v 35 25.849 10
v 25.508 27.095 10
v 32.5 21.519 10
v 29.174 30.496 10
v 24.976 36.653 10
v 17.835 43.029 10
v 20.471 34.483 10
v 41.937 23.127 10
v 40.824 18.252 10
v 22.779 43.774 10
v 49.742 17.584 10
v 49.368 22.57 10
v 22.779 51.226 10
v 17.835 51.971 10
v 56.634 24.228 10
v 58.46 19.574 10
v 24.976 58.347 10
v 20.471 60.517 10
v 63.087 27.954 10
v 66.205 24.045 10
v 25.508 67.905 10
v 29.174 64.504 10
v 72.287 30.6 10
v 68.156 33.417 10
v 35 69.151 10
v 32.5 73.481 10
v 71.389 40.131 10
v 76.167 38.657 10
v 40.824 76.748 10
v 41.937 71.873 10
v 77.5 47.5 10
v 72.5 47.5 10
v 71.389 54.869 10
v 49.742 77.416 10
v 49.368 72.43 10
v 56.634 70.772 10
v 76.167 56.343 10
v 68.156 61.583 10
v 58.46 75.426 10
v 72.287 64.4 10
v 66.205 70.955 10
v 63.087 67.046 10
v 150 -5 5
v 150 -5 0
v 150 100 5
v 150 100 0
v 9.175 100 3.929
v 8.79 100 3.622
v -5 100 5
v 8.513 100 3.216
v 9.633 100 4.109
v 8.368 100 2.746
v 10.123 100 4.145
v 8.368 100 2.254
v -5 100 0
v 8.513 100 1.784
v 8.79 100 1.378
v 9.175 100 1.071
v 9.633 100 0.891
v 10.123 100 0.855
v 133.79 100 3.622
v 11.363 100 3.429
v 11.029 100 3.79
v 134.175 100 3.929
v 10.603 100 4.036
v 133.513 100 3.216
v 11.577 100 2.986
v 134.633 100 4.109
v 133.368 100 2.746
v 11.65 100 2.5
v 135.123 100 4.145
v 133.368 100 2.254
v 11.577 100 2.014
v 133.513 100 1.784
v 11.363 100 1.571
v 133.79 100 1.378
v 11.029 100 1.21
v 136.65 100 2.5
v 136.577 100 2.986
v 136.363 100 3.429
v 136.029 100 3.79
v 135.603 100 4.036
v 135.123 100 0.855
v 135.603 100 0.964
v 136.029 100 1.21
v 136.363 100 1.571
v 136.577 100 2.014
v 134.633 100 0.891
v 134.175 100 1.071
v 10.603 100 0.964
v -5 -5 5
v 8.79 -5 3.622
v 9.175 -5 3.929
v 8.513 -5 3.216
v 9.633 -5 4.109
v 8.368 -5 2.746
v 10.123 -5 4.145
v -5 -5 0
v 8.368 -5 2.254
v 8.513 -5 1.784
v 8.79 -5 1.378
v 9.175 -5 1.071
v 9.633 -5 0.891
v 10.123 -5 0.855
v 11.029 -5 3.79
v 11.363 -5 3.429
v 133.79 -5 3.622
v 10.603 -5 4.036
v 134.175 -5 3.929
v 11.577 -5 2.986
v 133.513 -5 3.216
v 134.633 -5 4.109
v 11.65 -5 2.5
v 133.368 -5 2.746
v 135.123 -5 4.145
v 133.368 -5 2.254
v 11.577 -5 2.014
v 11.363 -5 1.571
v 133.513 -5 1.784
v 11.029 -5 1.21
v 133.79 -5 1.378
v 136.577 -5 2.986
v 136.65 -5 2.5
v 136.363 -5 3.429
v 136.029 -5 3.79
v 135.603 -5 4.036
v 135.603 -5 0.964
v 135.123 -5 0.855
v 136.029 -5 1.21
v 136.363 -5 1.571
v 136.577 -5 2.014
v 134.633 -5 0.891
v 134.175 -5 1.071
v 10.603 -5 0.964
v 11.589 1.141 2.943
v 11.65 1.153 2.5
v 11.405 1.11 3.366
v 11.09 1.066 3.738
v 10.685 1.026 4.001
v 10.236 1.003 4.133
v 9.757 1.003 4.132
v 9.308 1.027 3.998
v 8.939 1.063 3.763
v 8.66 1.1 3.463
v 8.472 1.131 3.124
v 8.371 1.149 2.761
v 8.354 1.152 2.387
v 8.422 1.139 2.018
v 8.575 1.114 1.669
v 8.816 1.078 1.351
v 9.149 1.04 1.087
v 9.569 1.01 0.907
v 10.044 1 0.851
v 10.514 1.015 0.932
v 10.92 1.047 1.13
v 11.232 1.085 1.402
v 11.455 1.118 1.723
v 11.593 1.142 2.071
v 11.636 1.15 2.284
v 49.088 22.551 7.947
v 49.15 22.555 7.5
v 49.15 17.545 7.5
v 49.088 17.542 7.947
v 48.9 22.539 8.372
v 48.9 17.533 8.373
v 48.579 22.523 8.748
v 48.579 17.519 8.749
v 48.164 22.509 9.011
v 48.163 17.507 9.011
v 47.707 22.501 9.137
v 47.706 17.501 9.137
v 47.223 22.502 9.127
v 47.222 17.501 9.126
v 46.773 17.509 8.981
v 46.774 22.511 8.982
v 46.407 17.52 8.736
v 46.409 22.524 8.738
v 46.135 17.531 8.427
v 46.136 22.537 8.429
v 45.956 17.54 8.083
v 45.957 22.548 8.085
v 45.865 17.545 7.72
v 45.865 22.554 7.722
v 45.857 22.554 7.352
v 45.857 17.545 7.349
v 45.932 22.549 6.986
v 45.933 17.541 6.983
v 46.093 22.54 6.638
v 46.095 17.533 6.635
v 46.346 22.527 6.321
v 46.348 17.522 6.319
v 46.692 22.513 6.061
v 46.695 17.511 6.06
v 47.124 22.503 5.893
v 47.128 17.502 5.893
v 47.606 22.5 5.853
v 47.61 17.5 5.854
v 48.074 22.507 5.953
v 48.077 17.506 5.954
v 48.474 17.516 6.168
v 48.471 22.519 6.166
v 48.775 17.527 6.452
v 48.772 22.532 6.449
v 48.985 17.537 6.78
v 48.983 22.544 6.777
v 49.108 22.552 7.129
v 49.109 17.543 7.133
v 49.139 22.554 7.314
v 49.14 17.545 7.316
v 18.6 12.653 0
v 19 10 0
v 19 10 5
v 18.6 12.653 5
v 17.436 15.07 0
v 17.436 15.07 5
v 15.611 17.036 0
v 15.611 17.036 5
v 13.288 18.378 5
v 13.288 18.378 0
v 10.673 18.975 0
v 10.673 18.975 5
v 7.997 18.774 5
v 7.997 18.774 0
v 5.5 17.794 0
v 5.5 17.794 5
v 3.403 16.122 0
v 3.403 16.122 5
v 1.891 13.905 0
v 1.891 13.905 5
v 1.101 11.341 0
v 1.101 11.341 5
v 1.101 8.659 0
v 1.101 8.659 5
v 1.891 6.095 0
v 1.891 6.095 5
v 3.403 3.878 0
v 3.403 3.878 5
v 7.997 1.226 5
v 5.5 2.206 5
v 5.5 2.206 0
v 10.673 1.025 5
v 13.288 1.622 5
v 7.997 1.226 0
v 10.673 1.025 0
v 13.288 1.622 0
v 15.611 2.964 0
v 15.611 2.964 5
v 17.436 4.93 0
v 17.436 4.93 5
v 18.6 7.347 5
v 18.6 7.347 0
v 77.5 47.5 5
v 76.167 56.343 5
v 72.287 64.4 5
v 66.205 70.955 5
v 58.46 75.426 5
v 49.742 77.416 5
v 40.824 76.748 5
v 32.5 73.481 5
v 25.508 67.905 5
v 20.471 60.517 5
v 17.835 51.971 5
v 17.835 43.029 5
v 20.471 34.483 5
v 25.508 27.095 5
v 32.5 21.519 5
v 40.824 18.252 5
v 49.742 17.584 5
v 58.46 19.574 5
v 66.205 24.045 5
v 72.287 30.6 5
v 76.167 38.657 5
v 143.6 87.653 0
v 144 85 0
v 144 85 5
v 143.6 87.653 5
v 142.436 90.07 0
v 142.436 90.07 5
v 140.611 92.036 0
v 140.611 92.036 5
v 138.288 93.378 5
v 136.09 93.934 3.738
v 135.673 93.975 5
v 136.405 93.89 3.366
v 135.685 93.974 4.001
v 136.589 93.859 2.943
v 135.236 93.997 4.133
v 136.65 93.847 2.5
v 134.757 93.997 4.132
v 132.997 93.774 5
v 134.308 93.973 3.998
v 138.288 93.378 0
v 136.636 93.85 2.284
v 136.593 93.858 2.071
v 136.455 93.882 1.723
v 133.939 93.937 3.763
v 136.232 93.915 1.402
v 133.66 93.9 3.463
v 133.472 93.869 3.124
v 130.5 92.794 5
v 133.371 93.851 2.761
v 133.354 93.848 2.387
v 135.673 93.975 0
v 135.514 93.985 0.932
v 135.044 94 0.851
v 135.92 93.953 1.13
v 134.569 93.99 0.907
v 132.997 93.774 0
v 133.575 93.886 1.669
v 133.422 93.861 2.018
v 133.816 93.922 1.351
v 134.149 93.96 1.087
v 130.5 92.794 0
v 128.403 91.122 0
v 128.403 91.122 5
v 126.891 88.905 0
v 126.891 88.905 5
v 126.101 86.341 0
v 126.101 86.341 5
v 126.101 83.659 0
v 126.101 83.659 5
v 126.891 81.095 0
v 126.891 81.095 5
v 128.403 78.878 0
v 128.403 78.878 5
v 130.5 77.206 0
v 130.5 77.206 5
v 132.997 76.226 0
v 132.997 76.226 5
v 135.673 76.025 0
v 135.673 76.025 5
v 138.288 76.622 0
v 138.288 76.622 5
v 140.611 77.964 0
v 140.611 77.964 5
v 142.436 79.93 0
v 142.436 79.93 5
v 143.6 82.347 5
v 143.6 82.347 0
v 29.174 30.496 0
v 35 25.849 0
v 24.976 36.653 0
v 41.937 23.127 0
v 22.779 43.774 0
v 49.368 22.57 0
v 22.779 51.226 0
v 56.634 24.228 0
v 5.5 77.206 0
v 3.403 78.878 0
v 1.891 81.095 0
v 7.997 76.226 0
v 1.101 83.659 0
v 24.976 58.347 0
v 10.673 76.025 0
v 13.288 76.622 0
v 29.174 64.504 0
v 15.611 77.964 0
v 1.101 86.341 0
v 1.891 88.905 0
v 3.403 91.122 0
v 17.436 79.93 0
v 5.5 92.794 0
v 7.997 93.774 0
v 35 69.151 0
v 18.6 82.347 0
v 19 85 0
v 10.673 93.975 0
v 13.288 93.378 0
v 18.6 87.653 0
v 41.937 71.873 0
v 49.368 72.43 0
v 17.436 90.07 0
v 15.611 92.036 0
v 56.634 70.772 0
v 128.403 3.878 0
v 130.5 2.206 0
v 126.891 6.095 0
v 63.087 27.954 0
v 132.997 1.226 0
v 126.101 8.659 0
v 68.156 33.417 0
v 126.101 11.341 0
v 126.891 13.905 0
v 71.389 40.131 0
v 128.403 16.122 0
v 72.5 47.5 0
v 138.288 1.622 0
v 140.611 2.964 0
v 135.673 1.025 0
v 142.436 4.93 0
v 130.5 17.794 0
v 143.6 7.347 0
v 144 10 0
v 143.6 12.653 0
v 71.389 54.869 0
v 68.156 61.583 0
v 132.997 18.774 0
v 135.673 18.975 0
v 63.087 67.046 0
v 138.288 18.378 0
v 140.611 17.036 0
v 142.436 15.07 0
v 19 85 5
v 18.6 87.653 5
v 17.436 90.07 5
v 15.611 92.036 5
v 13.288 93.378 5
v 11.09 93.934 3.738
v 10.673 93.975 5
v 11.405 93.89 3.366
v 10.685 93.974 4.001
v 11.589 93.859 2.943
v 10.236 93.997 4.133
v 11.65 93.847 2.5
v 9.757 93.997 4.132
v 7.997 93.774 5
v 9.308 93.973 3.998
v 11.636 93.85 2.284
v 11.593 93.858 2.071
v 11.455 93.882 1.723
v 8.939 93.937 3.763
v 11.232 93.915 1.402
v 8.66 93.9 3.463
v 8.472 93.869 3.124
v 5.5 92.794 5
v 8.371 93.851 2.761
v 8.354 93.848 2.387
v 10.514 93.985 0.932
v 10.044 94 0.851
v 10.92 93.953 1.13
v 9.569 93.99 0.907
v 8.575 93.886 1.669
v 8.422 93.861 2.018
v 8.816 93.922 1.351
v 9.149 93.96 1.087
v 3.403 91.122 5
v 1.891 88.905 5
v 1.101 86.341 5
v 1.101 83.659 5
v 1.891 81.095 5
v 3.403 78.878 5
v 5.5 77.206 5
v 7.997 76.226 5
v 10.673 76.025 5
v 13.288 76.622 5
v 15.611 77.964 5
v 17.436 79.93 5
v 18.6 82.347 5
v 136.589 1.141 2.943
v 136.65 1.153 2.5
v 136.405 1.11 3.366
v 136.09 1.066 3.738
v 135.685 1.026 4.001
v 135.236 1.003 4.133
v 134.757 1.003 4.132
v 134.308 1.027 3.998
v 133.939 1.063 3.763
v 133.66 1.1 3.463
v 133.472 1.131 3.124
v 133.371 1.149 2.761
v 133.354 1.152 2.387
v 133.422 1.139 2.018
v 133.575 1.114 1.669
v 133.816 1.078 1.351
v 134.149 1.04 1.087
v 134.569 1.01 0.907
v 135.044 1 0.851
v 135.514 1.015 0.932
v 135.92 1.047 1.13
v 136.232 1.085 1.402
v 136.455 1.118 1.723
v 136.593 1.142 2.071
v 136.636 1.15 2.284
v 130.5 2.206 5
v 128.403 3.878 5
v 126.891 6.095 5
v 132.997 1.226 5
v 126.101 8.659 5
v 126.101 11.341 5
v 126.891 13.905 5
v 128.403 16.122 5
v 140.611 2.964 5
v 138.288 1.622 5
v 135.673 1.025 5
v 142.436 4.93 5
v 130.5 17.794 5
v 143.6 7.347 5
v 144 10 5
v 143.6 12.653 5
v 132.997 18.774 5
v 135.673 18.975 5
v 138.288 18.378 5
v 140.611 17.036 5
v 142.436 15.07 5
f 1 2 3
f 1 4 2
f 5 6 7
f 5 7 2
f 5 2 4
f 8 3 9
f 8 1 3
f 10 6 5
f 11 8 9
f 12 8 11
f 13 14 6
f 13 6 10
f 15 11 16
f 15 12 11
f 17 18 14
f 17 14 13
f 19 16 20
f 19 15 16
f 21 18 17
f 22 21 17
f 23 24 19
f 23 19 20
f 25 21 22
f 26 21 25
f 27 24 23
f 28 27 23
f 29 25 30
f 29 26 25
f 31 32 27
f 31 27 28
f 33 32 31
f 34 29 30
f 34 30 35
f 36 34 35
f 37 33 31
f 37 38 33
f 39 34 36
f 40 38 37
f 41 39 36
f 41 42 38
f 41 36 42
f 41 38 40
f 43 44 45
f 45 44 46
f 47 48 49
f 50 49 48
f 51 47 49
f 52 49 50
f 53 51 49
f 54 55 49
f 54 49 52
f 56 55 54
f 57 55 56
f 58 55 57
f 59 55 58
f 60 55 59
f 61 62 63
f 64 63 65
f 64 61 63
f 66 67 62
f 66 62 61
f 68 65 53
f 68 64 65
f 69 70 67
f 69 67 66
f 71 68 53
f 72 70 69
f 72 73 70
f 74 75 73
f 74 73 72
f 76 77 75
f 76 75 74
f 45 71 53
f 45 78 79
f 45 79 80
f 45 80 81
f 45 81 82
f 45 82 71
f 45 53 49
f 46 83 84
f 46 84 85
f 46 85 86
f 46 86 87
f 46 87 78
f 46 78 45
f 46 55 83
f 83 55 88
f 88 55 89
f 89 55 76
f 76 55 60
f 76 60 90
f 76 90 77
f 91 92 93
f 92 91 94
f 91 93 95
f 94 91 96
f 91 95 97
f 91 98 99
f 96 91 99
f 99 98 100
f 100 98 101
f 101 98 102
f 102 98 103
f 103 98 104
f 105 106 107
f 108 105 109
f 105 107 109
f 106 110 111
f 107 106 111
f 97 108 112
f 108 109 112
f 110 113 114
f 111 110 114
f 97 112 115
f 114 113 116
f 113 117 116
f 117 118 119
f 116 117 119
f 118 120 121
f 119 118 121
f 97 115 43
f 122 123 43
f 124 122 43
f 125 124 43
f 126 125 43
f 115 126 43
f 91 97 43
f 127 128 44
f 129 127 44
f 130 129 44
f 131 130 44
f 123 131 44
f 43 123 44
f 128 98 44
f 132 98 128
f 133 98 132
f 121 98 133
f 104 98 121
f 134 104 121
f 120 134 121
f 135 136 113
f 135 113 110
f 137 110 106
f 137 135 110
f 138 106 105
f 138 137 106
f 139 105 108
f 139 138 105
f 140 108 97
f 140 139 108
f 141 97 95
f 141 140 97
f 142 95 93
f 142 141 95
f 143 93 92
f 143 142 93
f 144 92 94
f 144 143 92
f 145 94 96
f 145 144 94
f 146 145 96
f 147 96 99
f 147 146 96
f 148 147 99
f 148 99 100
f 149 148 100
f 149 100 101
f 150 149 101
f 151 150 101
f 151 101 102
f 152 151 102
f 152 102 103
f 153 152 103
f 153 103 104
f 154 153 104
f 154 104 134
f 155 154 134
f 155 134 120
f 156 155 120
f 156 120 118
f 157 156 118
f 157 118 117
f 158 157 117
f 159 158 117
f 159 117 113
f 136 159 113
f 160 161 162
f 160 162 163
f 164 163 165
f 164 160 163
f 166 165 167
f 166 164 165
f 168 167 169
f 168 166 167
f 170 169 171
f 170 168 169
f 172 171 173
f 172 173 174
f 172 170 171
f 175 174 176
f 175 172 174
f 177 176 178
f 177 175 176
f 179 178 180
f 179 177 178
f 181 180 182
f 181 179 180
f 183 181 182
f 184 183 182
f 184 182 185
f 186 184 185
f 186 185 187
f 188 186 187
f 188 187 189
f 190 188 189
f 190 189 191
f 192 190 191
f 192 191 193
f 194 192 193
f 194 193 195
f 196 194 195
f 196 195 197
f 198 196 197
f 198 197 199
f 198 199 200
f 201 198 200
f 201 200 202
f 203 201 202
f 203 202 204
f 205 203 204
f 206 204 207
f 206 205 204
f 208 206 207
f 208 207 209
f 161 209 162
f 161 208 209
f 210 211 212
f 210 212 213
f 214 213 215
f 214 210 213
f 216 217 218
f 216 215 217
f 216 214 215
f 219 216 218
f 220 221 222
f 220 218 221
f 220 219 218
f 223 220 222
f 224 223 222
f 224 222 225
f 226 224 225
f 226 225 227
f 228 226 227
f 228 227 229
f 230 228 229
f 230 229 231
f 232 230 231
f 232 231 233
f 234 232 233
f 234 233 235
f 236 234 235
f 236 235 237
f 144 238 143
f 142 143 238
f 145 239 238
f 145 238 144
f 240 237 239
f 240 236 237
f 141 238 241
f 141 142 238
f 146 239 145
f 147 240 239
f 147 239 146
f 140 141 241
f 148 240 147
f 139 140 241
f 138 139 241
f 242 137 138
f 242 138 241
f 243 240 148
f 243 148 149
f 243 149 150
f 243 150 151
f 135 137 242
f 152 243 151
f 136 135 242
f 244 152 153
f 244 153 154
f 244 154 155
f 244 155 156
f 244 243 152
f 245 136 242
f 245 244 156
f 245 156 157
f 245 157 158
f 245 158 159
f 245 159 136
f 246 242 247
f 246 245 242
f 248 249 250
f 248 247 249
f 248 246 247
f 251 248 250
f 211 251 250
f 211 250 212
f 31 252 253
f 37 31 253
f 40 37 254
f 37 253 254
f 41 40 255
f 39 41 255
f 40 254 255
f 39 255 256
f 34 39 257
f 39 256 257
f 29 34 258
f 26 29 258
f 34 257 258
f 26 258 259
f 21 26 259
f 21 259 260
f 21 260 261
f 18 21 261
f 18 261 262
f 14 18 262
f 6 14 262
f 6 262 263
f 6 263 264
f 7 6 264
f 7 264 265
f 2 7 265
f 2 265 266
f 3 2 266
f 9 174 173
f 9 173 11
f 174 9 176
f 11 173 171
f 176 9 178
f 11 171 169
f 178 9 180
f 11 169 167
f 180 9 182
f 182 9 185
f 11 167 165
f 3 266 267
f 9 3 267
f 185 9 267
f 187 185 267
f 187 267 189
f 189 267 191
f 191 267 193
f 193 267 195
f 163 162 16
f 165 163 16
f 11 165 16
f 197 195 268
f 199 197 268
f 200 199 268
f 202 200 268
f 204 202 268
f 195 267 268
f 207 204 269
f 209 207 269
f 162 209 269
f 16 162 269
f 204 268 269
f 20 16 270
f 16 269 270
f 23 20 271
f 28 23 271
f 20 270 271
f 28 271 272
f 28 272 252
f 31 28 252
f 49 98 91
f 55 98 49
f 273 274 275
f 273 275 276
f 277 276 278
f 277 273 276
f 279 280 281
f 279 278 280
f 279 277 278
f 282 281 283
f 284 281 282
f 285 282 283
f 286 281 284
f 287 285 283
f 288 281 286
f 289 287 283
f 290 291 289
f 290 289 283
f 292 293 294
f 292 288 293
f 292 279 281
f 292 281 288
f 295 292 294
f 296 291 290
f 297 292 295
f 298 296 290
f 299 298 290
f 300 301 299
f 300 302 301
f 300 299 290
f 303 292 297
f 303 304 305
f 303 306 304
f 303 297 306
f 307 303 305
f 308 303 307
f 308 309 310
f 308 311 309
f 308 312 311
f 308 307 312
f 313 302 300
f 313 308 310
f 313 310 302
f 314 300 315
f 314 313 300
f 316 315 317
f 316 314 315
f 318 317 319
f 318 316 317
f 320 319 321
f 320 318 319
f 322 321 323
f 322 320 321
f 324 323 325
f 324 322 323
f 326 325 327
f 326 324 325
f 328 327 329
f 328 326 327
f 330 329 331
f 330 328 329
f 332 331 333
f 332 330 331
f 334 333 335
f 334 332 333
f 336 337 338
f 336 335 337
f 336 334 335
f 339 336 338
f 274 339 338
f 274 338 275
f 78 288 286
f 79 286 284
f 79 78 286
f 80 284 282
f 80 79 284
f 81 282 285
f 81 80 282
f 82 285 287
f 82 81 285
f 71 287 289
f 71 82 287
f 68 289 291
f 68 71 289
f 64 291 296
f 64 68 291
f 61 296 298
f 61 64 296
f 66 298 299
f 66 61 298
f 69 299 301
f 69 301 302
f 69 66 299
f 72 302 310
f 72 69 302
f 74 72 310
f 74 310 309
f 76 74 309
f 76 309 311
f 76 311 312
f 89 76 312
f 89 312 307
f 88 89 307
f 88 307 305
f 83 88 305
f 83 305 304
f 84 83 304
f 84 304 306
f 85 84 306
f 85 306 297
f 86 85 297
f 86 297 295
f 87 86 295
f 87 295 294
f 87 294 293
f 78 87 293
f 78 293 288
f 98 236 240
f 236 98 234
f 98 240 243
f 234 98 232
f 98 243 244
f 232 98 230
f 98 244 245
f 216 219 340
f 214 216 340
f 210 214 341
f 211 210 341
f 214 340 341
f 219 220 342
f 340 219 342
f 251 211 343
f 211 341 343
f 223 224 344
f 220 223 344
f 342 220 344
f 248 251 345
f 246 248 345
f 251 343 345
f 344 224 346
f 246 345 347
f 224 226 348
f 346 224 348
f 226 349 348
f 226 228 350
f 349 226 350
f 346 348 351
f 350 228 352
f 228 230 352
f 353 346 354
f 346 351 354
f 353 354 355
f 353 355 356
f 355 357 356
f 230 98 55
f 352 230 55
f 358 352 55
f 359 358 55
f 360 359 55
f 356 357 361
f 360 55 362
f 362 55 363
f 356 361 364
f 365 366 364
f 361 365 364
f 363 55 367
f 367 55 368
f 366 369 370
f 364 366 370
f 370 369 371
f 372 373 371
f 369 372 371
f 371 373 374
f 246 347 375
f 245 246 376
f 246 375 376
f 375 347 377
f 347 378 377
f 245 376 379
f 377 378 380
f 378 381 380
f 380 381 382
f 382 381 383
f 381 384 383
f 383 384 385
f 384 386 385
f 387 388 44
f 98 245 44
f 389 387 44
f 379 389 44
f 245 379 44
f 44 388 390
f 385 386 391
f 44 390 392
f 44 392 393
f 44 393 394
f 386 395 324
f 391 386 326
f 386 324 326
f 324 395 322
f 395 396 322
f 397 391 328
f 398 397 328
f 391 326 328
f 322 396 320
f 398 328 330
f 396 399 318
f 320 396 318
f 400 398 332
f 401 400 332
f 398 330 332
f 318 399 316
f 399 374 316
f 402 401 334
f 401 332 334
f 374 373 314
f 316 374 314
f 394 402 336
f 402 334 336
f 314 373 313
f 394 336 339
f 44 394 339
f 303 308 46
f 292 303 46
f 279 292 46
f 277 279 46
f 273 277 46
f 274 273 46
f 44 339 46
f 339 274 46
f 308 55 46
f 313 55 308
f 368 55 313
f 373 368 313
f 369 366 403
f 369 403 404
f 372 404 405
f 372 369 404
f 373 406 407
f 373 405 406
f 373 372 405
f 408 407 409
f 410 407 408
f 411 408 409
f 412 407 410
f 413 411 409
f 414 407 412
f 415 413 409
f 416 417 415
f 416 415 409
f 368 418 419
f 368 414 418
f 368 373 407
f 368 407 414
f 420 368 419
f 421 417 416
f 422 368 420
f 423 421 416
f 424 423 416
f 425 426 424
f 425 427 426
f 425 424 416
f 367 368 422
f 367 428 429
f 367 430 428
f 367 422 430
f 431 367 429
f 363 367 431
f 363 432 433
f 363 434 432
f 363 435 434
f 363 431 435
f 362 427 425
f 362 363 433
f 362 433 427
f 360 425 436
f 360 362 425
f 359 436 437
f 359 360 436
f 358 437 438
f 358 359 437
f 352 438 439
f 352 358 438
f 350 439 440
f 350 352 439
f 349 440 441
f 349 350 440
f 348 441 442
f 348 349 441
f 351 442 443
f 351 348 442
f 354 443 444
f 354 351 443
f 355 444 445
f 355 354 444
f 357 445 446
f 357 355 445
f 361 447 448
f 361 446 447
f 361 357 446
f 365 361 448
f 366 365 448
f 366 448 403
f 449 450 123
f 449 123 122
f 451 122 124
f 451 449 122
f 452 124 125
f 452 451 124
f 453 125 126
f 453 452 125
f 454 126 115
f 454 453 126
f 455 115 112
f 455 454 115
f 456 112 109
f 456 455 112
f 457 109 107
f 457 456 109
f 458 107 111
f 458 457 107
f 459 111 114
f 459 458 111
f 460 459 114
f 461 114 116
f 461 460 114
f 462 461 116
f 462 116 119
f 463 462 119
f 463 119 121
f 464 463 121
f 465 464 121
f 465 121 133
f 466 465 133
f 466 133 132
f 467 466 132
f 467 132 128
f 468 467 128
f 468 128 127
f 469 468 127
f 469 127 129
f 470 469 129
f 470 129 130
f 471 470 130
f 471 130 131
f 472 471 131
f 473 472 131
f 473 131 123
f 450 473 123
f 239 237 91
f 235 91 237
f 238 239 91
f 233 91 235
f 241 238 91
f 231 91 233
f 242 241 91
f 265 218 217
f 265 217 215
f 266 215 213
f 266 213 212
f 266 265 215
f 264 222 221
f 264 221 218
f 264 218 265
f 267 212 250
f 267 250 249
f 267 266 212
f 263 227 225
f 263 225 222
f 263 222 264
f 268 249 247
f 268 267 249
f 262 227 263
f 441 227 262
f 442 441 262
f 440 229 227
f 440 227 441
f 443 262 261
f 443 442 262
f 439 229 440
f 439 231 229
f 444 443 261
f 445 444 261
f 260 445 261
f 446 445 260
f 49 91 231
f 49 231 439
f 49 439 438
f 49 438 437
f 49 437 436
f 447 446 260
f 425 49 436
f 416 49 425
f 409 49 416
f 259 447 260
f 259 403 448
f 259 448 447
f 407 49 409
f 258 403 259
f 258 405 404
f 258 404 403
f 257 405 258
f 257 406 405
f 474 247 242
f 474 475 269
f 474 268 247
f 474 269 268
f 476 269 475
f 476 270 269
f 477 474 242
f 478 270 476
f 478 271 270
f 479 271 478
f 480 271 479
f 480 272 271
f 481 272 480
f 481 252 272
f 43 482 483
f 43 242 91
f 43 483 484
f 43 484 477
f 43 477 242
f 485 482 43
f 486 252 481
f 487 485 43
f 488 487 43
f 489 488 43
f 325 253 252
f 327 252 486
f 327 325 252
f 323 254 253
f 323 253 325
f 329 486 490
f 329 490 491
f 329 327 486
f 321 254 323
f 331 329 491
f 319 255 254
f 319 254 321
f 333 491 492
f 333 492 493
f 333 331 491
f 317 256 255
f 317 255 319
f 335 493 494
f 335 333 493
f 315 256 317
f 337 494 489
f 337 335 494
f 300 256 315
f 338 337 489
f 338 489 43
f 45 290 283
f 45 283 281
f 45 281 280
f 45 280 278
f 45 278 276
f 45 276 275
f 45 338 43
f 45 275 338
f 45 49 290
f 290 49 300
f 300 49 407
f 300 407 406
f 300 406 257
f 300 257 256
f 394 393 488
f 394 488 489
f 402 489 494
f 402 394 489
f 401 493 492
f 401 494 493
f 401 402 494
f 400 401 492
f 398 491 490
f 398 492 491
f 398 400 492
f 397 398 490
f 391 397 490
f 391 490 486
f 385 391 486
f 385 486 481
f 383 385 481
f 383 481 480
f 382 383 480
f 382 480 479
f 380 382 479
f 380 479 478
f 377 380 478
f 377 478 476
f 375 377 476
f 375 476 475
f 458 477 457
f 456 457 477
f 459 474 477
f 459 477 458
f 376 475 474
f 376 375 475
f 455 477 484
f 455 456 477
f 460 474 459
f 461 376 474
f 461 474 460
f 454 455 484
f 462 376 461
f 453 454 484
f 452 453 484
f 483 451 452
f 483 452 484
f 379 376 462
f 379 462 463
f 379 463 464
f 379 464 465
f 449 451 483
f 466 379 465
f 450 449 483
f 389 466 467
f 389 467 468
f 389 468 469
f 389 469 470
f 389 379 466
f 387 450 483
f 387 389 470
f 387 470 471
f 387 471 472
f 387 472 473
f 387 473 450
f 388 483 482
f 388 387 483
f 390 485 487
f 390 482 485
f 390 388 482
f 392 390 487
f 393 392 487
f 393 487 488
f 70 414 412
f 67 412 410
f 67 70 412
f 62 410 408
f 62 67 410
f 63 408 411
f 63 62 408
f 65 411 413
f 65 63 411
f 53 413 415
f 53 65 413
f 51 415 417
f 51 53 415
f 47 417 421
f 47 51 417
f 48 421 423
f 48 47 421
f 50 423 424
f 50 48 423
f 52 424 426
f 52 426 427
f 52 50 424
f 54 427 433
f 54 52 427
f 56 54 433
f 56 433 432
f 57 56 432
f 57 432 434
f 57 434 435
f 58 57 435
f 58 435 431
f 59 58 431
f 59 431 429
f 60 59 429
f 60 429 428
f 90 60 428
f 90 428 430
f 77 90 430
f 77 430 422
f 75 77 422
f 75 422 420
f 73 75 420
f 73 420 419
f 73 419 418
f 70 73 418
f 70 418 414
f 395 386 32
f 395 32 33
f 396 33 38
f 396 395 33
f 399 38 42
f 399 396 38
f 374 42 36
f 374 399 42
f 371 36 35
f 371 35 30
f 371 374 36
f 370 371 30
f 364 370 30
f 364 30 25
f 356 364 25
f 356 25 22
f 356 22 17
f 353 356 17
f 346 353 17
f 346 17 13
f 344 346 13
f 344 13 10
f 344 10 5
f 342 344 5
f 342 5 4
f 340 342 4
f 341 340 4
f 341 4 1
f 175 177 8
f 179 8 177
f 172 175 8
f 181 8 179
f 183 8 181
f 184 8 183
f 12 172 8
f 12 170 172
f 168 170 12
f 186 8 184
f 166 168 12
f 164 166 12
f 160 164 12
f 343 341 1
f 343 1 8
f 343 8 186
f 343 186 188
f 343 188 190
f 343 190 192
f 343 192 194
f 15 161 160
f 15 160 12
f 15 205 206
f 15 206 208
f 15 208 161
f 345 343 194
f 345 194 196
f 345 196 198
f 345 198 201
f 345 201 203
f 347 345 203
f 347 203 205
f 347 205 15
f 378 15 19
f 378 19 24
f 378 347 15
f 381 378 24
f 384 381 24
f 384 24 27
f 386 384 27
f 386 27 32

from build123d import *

# Parameters (mm, degrees)
CYLINDER013_R     = 1.65
CYLINDER013_DEPTH = 10
CYLINDER012_R     = 25
CYLINDER012_DEPTH = 10
CYLINDER004_R     = 1.65
CYLINDER004_DEPTH = 10
CYLINDER005_R     = 1.65
CYLINDER005_DEPTH = 10
CYLINDER006_R     = 1.65
CYLINDER006_DEPTH = 10
CYLINDER007_R     = 1.65
CYLINDER007_DEPTH = 10
CYLINDER001_R     = 9
CYLINDER001_DEPTH = 100
CYLINDER002_R     = 9
CYLINDER002_DEPTH = 100
CYLINDER003_R     = 9
CYLINDER003_DEPTH = 100
CYLINDER_R        = 9
CYLINDER_DEPTH    = 100
BOX_W             = 155
BOX_H             = 105
BOX_DEPTH         = 5
CYLINDER009_R     = 25
CYLINDER009_DEPTH = 10
CYLINDER008_R     = 30
CYLINDER008_DEPTH = 5


with BuildPart() as zylinder013:
    # Cylinder013 → Cylinder013 (new body)
    with BuildSketch(Plane(origin=(47.5, 25, 7.5), x_dir=(1, 0, 0), z_dir=(0, -1, 0))):
        Circle(CYLINDER013_R)
    extrude(amount=CYLINDER013_DEPTH)


with BuildPart() as zylinder012:
    # Cylinder012 → Cylinder012 (new body)
    with BuildSketch(Plane(origin=(47.5, 47.5, 0), x_dir=(1, 0, 0), z_dir=(0, 0, 1))):
        Circle(CYLINDER012_R)
    extrude(amount=CYLINDER012_DEPTH)


with BuildPart() as zylinder004:
    # Cylinder004 → Cylinder004 (new body)
    with BuildSketch(Plane(origin=(10, 5, 2.5), x_dir=(1, 0, 0), z_dir=(0, -1, 0))):
        Circle(CYLINDER004_R)
    extrude(amount=CYLINDER004_DEPTH)


with BuildPart() as zylinder005:
    # Cylinder005 → Cylinder005 (new body)
    with BuildSketch(Plane(origin=(10, 100, 2.5), x_dir=(1, 0, 0), z_dir=(0, -1, 0))):
        Circle(CYLINDER005_R)
    extrude(amount=CYLINDER005_DEPTH)


with BuildPart() as zylinder006:
    # Cylinder006 → Cylinder006 (new body)
    with BuildSketch(Plane(origin=(135, 5, 2.5), x_dir=(1, 0, 0), z_dir=(0, -1, 0))):
        Circle(CYLINDER006_R)
    extrude(amount=CYLINDER006_DEPTH)


with BuildPart() as compound001:
    # Cylinder007 → Cylinder007 (new body)
    with BuildSketch(Plane(origin=(135, 100, 2.5), x_dir=(1, 0, 0), z_dir=(0, -1, 0))):
        Circle(CYLINDER007_R)
    extrude(amount=CYLINDER007_DEPTH)

    # Compound001: union Zylinder004, Zylinder005, Zylinder006
    add(zylinder004.part)
    add(zylinder005.part)
    add(zylinder006.part)


with BuildPart() as zylinder001:
    # Cylinder001 → Cylinder001 (new body)
    with BuildSketch(Plane(origin=(135, 85, -10), x_dir=(1, 0, 0), z_dir=(0, 0, 1))):
        Circle(CYLINDER001_R)
    extrude(amount=CYLINDER001_DEPTH)


with BuildPart() as zylinder002:
    # Cylinder002 → Cylinder002 (new body)
    with BuildSketch(Plane(origin=(10, 85, -10), x_dir=(1, 0, 0), z_dir=(0, 0, 1))):
        Circle(CYLINDER002_R)
    extrude(amount=CYLINDER002_DEPTH)


with BuildPart() as zylinder003:
    # Cylinder003 → Cylinder003 (new body)
    with BuildSketch(Plane(origin=(135, 10, -10), x_dir=(1, 0, 0), z_dir=(0, 0, 1))):
        Circle(CYLINDER003_R)
    extrude(amount=CYLINDER003_DEPTH)


with BuildPart() as posts1:
    # Cylinder → Cylinder (new body)
    with BuildSketch(Plane(origin=(10, 10, -10), x_dir=(1, 0, 0), z_dir=(0, 0, 1))):
        Circle(CYLINDER_R)
    extrude(amount=CYLINDER_DEPTH)

    # Compound: union Zylinder001, Zylinder002, Zylinder003
    add(zylinder001.part)
    add(zylinder002.part)
    add(zylinder003.part)


with BuildPart() as cut004:
    # Box → Box (new body)
    with BuildSketch(Plane(origin=(-5, -5, 0), x_dir=(1, 0, 0), z_dir=(0, 0, 1))):
        with Locations((77.5, 52.5)):
            Rectangle(BOX_W, BOX_H)
    extrude(amount=BOX_DEPTH)

    # Cut: cut Posts1
    add(posts1.part, mode=Mode.SUBTRACT)

    # Cut001: cut Compound001
    add(compound001.part, mode=Mode.SUBTRACT)

    # Cut004: cut Zylinder012
    add(zylinder012.part, mode=Mode.SUBTRACT)


with BuildPart() as zylinder009:
    # Cylinder009 → Cylinder009 (new body)
    with BuildSketch(Plane(origin=(47.5, 47.5, 0), x_dir=(1, 0, 0), z_dir=(0, 0, 1))):
        Circle(CYLINDER009_R)
    extrude(amount=CYLINDER009_DEPTH)


with BuildPart() as plate:
    # Cylinder008 → Cylinder008 (new body)
    with BuildSketch(Plane(origin=(47.5, 47.5, 5), x_dir=(1, 0, 0), z_dir=(0, 0, 1))):
        Circle(CYLINDER008_R)
    extrude(amount=CYLINDER008_DEPTH)

    # Cut002: cut Zylinder009
    add(zylinder009.part, mode=Mode.SUBTRACT)

    # Fusion: union Cut004
    add(cut004.part)

    # Cut005: cut Zylinder013
    add(zylinder013.part, mode=Mode.SUBTRACT)


solid = plate.part
